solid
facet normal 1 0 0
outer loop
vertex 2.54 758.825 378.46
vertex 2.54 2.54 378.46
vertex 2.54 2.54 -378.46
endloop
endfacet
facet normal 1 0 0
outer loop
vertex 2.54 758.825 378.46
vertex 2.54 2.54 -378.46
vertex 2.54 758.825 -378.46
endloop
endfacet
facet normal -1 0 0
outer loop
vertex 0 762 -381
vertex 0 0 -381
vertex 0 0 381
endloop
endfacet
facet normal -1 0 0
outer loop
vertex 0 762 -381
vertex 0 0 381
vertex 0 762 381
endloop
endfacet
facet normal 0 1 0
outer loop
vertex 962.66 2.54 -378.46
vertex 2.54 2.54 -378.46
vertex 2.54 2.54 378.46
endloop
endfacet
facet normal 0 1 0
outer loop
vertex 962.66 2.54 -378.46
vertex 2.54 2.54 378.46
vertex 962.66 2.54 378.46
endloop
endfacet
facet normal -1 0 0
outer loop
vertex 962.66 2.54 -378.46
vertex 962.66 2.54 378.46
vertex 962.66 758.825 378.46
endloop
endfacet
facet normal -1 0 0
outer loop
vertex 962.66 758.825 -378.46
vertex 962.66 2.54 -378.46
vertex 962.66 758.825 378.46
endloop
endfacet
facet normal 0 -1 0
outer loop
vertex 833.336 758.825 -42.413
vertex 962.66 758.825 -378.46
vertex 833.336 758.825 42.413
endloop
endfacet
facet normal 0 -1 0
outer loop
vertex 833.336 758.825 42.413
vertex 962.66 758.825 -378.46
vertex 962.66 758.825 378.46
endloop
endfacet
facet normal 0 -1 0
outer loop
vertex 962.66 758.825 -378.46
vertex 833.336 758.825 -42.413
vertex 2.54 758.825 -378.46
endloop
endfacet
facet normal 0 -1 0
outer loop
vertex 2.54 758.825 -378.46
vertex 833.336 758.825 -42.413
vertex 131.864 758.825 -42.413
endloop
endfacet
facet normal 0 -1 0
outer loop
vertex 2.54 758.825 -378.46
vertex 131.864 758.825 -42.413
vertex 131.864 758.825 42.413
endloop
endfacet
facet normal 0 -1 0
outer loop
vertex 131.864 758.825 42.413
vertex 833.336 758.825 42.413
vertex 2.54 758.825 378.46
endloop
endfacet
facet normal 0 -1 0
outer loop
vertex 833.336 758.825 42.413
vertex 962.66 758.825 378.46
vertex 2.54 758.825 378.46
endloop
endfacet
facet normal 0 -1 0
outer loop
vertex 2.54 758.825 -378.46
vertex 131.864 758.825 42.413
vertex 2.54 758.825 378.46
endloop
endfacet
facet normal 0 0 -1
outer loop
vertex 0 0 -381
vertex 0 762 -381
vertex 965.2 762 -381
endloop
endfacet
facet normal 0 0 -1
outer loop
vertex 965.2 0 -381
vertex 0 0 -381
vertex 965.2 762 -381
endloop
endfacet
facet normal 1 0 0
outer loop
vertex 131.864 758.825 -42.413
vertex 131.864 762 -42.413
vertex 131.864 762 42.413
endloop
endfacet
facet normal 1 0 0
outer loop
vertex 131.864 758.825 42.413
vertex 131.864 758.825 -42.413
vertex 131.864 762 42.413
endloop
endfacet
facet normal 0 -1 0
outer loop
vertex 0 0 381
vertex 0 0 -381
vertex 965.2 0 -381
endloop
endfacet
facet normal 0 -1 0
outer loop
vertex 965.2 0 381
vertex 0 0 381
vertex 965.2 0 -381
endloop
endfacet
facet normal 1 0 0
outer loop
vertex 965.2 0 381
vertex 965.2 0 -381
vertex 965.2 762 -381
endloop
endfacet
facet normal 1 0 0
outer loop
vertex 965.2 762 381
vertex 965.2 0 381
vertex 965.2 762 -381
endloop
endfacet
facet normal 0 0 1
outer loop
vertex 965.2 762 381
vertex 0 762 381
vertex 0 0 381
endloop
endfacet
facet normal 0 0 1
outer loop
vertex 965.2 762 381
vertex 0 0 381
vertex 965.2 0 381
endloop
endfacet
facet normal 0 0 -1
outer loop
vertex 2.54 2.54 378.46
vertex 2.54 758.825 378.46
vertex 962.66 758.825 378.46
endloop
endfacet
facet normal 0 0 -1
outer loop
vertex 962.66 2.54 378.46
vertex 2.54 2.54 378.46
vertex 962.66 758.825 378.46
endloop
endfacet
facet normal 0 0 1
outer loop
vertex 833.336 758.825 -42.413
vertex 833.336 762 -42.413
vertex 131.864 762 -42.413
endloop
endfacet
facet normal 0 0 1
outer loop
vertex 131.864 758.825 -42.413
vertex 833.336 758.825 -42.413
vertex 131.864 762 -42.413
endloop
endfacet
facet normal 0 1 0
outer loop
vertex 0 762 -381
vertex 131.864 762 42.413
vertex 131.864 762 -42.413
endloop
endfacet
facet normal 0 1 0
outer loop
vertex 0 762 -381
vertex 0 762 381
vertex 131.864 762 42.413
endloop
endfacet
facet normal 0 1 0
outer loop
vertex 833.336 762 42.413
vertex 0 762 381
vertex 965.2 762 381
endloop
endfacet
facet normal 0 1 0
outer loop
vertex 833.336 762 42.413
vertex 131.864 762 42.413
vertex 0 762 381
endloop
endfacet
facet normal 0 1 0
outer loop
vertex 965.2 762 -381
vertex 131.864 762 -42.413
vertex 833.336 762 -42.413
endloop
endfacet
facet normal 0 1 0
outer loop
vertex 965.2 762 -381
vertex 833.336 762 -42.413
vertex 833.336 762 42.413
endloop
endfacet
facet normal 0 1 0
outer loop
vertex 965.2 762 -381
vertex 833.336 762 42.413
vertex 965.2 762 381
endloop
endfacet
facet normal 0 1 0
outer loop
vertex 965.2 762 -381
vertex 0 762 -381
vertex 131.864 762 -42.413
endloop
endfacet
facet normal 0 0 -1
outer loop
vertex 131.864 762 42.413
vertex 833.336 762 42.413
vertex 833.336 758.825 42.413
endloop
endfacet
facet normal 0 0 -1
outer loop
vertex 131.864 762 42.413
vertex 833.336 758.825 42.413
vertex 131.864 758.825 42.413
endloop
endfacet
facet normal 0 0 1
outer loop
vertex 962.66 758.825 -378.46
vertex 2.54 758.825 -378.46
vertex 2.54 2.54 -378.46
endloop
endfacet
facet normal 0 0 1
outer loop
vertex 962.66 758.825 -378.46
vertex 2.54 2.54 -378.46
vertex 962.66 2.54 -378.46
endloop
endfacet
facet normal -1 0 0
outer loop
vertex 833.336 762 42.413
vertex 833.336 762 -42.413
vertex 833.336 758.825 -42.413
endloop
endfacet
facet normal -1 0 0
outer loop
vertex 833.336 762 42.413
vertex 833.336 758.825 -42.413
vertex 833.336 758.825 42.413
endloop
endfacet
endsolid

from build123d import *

# Parameters (mm, degrees)
EXTRUDE1_START     = -381
EXTRUDE1_OUTLINE_W = 965.2
EXTRUDE1_OUTLINE_H = 762
EXTRUDE1_DEPTH     = 762
SHELL1_T           = -2.54
SKETCH3_W          = 965.2
SKETCH3_H          = 762
SKETCH3_W_2        = 701.471738738
SKETCH3_H_2        = 84.826616214
EXTRUDE2_DEPTH     = 3.175


# Read off the part's stored shape, not the designer's step: Extrude1
with BuildPart() as part:
    # Extrude1 outline → Extrude1 (new body)
    with BuildSketch(Plane.XY.offset(EXTRUDE1_START)):
        with Locations((482.6, 381)):
            Rectangle(EXTRUDE1_OUTLINE_W, EXTRUDE1_OUTLINE_H)
    extrude(amount=EXTRUDE1_DEPTH)

    # Shell1
    shell1_openings = [part.faces().sort_by_distance(p)[0] for p in [
        (482.6, 762, 0),
    ]]
    offset(amount=SHELL1_T, openings=shell1_openings, kind=Kind.INTERSECTION)

    # Sketch3 → Extrude2 (add)
    with BuildSketch(Plane(origin=(0, 762, 0), x_dir=(-1, 0, 0), z_dir=(0, 1, 0))):
        with Locations((-482.6, 0)):
            Rectangle(SKETCH3_W, SKETCH3_H)
        with Locations((-482.6, 0)):
            Rectangle(SKETCH3_W_2, SKETCH3_H_2, mode=Mode.SUBTRACT)
    extrude(amount=-EXTRUDE2_DEPTH)


solid = part.part
